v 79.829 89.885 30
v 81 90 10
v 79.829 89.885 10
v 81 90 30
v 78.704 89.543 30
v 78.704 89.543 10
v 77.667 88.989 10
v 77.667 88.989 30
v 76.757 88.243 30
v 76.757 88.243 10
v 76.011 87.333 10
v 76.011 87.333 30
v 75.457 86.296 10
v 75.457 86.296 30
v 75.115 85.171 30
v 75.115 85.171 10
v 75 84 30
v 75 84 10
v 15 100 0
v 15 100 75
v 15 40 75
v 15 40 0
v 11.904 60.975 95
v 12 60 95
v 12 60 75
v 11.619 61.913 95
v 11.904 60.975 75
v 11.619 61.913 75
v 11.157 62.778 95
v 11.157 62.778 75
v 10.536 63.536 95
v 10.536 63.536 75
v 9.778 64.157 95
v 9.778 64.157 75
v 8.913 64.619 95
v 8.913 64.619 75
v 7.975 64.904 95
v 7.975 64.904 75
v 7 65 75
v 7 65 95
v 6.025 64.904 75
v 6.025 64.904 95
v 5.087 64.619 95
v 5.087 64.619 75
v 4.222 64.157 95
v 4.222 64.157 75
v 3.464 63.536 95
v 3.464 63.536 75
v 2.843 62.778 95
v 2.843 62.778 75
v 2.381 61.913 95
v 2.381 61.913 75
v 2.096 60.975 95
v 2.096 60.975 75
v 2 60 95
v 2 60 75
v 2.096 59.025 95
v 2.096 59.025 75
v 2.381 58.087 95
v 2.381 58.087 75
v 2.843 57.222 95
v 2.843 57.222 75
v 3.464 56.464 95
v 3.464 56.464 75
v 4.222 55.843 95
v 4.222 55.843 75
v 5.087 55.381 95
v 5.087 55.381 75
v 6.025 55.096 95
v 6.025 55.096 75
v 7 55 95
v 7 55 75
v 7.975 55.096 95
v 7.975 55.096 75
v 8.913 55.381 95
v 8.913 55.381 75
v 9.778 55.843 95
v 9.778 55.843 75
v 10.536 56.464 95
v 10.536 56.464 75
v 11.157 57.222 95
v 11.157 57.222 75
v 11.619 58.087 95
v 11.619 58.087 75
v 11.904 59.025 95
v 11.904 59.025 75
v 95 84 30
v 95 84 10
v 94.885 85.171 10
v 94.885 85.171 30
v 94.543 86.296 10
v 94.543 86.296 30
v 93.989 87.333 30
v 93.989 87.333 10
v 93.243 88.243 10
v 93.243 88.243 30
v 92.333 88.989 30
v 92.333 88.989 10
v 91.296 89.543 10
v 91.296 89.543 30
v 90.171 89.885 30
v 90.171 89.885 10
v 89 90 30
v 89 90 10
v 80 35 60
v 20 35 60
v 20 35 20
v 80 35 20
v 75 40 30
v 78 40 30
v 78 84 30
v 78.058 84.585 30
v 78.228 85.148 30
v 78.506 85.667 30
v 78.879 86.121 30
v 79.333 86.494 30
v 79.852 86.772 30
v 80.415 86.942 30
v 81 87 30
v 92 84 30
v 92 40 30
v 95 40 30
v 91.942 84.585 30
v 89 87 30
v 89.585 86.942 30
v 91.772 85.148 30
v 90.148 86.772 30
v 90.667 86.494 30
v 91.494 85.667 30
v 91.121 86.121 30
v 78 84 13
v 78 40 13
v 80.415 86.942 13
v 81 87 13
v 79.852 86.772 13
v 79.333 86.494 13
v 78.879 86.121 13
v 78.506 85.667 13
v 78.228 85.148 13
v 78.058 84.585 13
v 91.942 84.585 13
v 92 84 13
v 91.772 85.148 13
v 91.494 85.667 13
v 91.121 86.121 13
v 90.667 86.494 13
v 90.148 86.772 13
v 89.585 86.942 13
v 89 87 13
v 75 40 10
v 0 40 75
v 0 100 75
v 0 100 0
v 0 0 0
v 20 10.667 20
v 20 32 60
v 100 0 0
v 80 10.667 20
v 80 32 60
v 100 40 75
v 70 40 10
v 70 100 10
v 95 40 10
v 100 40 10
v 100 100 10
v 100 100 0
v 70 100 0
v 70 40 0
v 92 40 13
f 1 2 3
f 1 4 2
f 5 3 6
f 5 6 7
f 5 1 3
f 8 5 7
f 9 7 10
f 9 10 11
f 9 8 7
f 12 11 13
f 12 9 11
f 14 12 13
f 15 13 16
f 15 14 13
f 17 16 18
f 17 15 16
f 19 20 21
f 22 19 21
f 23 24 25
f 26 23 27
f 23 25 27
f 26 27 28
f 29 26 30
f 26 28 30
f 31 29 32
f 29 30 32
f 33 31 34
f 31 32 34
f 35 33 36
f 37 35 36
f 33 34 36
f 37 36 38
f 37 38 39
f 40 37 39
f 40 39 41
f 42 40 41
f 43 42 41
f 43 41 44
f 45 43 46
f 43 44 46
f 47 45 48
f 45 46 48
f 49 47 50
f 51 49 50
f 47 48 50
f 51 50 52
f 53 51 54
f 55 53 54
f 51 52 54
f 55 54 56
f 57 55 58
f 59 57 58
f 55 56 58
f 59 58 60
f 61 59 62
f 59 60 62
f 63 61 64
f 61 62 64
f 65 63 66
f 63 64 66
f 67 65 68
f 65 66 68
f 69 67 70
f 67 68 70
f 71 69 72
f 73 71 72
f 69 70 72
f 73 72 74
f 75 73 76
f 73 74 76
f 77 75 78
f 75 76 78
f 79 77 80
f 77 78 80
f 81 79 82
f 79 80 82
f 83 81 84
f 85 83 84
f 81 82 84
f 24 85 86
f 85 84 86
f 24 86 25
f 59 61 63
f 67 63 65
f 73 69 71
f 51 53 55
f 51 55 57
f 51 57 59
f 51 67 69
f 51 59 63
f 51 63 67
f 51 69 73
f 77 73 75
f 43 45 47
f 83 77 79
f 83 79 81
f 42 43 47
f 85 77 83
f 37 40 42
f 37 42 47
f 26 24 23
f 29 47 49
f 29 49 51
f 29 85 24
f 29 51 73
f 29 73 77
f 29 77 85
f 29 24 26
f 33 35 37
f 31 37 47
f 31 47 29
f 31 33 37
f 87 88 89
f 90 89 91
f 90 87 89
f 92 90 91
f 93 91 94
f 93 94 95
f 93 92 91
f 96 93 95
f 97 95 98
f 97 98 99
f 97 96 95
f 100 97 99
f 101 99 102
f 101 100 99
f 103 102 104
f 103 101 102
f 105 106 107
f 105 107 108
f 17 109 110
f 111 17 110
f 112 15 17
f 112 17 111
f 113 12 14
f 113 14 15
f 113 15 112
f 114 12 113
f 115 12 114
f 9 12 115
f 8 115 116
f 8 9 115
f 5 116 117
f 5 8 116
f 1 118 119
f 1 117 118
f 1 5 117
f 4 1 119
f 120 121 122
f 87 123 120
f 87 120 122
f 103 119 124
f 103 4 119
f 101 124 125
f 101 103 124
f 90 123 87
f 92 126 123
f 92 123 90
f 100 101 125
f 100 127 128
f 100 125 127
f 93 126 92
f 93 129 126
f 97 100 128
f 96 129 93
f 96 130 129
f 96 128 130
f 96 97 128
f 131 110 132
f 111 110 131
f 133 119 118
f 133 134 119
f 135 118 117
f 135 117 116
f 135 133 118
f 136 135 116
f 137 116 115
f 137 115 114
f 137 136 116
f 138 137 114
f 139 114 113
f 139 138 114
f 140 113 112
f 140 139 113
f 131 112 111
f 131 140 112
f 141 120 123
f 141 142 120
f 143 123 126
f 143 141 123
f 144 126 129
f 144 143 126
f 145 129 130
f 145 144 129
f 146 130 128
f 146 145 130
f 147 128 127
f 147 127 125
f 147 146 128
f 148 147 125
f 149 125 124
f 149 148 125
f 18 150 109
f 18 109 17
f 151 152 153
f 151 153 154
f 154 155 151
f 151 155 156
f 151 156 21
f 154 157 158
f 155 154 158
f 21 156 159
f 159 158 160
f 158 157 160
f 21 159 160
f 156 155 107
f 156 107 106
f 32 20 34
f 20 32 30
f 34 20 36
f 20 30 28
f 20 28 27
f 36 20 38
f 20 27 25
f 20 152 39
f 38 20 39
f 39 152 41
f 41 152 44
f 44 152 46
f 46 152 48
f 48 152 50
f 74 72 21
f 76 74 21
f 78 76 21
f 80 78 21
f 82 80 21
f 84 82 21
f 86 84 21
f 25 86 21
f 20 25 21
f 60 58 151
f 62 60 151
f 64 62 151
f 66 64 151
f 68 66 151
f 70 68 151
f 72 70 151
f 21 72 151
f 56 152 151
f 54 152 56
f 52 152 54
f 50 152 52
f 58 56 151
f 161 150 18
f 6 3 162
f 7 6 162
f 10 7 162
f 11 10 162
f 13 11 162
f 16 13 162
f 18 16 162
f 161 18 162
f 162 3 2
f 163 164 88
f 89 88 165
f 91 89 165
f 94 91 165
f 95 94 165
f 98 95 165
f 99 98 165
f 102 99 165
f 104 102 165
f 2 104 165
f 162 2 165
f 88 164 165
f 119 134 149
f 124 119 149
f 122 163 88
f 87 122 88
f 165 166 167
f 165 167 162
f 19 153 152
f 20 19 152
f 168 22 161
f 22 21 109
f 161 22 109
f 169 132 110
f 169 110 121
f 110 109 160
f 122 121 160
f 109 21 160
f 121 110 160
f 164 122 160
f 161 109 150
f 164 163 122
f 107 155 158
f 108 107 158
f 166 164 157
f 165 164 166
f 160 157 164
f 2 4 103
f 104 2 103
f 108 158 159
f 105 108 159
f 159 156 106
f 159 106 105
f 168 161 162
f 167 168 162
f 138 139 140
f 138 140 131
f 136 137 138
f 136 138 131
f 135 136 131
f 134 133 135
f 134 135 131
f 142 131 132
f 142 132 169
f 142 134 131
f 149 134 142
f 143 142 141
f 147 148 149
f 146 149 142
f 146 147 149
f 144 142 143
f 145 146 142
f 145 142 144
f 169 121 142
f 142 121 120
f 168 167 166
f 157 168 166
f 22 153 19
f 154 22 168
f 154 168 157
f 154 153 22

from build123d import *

# Parameters (mm, degrees)
F0_W      = 100
F0_H      = 75
F1_DEPTH  = 40
F3_DEPTH  = 100.001
F4_W      = 60
F4_H      = 40
F5_DEPTH  = 35
F6_W      = 60
F6_H      = 10
F7_DEPTH  = 30
F8_W      = 20
F8_H      = 50
F9_DEPTH  = 20
F10_W     = 14
F10_H     = 47
F11_DEPTH = 17
F12_R     = 3
F13_R     = 6
F14_W     = 60
F14_H     = 75
F15_DEPTH = 15
F16_R     = 5
F17_DEPTH = 20


with BuildPart() as f1:
    # F0 (on Front) → F1 (new body)
    with BuildSketch(Plane.XZ):
        with Locations((50, 37.5)):
            Rectangle(F0_W, F0_H)
    extrude(amount=-F1_DEPTH)

    # F2 (on face) → F3 (cut, through all)
    with BuildSketch(Plane.YZ.offset(100)):
        Polygon((0, 0), (40, 75), (0, 75), align=None)
    extrude(amount=-F3_DEPTH, mode=Mode.SUBTRACT)

    # F4 (on Front) → F5 (cut)
    with BuildSketch(Plane.XZ):
        with Locations((50, 40)):
            Rectangle(F4_W, F4_H)
    extrude(amount=-F5_DEPTH, mode=Mode.SUBTRACT)

    # F6 (on face) → F7 (join)
    with BuildSketch(Plane.YZ.offset(100)):
        with Locations((70, 5)):
            Rectangle(F6_W, F6_H)
    extrude(amount=-F7_DEPTH)

    # F8 (on face) → F9 (join)
    with BuildSketch(Plane.XY.offset(10)):
        with Locations((85, 65)):
            Rectangle(F8_W, F8_H)
    extrude(amount=F9_DEPTH)

    # F10 (on face) → F11 (cut)
    with BuildSketch(Plane.XY.offset(30)):
        with Locations((85, 63.5)):
            Rectangle(F10_W, F10_H)
    extrude(amount=-F11_DEPTH, mode=Mode.SUBTRACT)

    # F12
    f12_edges = [f1.edges().sort_by_distance(p)[0] for p in [
        (78, 87, 21.5),
        (92, 87, 21.5),
    ]]
    fillet(f12_edges, radius=F12_R)

    # F13
    f13_edges = [f1.edges().sort_by_distance(p)[0] for p in [
        (75, 90, 20),
        (95, 90, 20),
    ]]
    fillet(f13_edges, radius=F13_R)

    # F14 (on face) → F15 (join)
    with BuildSketch(Plane(origin=(0, 0, 0), x_dir=(0, -1, 0), z_dir=(-1, 0, 0))):
        with Locations((-70, 37.5)):
            Rectangle(F14_W, F14_H)
    extrude(amount=-F15_DEPTH)

    # F16 (on face) → F17 (join)
    with BuildSketch(Plane.XY.offset(75)):
        with Locations((7, 60)):
            Circle(F16_R)
    extrude(amount=F17_DEPTH)


solid = f1.part
